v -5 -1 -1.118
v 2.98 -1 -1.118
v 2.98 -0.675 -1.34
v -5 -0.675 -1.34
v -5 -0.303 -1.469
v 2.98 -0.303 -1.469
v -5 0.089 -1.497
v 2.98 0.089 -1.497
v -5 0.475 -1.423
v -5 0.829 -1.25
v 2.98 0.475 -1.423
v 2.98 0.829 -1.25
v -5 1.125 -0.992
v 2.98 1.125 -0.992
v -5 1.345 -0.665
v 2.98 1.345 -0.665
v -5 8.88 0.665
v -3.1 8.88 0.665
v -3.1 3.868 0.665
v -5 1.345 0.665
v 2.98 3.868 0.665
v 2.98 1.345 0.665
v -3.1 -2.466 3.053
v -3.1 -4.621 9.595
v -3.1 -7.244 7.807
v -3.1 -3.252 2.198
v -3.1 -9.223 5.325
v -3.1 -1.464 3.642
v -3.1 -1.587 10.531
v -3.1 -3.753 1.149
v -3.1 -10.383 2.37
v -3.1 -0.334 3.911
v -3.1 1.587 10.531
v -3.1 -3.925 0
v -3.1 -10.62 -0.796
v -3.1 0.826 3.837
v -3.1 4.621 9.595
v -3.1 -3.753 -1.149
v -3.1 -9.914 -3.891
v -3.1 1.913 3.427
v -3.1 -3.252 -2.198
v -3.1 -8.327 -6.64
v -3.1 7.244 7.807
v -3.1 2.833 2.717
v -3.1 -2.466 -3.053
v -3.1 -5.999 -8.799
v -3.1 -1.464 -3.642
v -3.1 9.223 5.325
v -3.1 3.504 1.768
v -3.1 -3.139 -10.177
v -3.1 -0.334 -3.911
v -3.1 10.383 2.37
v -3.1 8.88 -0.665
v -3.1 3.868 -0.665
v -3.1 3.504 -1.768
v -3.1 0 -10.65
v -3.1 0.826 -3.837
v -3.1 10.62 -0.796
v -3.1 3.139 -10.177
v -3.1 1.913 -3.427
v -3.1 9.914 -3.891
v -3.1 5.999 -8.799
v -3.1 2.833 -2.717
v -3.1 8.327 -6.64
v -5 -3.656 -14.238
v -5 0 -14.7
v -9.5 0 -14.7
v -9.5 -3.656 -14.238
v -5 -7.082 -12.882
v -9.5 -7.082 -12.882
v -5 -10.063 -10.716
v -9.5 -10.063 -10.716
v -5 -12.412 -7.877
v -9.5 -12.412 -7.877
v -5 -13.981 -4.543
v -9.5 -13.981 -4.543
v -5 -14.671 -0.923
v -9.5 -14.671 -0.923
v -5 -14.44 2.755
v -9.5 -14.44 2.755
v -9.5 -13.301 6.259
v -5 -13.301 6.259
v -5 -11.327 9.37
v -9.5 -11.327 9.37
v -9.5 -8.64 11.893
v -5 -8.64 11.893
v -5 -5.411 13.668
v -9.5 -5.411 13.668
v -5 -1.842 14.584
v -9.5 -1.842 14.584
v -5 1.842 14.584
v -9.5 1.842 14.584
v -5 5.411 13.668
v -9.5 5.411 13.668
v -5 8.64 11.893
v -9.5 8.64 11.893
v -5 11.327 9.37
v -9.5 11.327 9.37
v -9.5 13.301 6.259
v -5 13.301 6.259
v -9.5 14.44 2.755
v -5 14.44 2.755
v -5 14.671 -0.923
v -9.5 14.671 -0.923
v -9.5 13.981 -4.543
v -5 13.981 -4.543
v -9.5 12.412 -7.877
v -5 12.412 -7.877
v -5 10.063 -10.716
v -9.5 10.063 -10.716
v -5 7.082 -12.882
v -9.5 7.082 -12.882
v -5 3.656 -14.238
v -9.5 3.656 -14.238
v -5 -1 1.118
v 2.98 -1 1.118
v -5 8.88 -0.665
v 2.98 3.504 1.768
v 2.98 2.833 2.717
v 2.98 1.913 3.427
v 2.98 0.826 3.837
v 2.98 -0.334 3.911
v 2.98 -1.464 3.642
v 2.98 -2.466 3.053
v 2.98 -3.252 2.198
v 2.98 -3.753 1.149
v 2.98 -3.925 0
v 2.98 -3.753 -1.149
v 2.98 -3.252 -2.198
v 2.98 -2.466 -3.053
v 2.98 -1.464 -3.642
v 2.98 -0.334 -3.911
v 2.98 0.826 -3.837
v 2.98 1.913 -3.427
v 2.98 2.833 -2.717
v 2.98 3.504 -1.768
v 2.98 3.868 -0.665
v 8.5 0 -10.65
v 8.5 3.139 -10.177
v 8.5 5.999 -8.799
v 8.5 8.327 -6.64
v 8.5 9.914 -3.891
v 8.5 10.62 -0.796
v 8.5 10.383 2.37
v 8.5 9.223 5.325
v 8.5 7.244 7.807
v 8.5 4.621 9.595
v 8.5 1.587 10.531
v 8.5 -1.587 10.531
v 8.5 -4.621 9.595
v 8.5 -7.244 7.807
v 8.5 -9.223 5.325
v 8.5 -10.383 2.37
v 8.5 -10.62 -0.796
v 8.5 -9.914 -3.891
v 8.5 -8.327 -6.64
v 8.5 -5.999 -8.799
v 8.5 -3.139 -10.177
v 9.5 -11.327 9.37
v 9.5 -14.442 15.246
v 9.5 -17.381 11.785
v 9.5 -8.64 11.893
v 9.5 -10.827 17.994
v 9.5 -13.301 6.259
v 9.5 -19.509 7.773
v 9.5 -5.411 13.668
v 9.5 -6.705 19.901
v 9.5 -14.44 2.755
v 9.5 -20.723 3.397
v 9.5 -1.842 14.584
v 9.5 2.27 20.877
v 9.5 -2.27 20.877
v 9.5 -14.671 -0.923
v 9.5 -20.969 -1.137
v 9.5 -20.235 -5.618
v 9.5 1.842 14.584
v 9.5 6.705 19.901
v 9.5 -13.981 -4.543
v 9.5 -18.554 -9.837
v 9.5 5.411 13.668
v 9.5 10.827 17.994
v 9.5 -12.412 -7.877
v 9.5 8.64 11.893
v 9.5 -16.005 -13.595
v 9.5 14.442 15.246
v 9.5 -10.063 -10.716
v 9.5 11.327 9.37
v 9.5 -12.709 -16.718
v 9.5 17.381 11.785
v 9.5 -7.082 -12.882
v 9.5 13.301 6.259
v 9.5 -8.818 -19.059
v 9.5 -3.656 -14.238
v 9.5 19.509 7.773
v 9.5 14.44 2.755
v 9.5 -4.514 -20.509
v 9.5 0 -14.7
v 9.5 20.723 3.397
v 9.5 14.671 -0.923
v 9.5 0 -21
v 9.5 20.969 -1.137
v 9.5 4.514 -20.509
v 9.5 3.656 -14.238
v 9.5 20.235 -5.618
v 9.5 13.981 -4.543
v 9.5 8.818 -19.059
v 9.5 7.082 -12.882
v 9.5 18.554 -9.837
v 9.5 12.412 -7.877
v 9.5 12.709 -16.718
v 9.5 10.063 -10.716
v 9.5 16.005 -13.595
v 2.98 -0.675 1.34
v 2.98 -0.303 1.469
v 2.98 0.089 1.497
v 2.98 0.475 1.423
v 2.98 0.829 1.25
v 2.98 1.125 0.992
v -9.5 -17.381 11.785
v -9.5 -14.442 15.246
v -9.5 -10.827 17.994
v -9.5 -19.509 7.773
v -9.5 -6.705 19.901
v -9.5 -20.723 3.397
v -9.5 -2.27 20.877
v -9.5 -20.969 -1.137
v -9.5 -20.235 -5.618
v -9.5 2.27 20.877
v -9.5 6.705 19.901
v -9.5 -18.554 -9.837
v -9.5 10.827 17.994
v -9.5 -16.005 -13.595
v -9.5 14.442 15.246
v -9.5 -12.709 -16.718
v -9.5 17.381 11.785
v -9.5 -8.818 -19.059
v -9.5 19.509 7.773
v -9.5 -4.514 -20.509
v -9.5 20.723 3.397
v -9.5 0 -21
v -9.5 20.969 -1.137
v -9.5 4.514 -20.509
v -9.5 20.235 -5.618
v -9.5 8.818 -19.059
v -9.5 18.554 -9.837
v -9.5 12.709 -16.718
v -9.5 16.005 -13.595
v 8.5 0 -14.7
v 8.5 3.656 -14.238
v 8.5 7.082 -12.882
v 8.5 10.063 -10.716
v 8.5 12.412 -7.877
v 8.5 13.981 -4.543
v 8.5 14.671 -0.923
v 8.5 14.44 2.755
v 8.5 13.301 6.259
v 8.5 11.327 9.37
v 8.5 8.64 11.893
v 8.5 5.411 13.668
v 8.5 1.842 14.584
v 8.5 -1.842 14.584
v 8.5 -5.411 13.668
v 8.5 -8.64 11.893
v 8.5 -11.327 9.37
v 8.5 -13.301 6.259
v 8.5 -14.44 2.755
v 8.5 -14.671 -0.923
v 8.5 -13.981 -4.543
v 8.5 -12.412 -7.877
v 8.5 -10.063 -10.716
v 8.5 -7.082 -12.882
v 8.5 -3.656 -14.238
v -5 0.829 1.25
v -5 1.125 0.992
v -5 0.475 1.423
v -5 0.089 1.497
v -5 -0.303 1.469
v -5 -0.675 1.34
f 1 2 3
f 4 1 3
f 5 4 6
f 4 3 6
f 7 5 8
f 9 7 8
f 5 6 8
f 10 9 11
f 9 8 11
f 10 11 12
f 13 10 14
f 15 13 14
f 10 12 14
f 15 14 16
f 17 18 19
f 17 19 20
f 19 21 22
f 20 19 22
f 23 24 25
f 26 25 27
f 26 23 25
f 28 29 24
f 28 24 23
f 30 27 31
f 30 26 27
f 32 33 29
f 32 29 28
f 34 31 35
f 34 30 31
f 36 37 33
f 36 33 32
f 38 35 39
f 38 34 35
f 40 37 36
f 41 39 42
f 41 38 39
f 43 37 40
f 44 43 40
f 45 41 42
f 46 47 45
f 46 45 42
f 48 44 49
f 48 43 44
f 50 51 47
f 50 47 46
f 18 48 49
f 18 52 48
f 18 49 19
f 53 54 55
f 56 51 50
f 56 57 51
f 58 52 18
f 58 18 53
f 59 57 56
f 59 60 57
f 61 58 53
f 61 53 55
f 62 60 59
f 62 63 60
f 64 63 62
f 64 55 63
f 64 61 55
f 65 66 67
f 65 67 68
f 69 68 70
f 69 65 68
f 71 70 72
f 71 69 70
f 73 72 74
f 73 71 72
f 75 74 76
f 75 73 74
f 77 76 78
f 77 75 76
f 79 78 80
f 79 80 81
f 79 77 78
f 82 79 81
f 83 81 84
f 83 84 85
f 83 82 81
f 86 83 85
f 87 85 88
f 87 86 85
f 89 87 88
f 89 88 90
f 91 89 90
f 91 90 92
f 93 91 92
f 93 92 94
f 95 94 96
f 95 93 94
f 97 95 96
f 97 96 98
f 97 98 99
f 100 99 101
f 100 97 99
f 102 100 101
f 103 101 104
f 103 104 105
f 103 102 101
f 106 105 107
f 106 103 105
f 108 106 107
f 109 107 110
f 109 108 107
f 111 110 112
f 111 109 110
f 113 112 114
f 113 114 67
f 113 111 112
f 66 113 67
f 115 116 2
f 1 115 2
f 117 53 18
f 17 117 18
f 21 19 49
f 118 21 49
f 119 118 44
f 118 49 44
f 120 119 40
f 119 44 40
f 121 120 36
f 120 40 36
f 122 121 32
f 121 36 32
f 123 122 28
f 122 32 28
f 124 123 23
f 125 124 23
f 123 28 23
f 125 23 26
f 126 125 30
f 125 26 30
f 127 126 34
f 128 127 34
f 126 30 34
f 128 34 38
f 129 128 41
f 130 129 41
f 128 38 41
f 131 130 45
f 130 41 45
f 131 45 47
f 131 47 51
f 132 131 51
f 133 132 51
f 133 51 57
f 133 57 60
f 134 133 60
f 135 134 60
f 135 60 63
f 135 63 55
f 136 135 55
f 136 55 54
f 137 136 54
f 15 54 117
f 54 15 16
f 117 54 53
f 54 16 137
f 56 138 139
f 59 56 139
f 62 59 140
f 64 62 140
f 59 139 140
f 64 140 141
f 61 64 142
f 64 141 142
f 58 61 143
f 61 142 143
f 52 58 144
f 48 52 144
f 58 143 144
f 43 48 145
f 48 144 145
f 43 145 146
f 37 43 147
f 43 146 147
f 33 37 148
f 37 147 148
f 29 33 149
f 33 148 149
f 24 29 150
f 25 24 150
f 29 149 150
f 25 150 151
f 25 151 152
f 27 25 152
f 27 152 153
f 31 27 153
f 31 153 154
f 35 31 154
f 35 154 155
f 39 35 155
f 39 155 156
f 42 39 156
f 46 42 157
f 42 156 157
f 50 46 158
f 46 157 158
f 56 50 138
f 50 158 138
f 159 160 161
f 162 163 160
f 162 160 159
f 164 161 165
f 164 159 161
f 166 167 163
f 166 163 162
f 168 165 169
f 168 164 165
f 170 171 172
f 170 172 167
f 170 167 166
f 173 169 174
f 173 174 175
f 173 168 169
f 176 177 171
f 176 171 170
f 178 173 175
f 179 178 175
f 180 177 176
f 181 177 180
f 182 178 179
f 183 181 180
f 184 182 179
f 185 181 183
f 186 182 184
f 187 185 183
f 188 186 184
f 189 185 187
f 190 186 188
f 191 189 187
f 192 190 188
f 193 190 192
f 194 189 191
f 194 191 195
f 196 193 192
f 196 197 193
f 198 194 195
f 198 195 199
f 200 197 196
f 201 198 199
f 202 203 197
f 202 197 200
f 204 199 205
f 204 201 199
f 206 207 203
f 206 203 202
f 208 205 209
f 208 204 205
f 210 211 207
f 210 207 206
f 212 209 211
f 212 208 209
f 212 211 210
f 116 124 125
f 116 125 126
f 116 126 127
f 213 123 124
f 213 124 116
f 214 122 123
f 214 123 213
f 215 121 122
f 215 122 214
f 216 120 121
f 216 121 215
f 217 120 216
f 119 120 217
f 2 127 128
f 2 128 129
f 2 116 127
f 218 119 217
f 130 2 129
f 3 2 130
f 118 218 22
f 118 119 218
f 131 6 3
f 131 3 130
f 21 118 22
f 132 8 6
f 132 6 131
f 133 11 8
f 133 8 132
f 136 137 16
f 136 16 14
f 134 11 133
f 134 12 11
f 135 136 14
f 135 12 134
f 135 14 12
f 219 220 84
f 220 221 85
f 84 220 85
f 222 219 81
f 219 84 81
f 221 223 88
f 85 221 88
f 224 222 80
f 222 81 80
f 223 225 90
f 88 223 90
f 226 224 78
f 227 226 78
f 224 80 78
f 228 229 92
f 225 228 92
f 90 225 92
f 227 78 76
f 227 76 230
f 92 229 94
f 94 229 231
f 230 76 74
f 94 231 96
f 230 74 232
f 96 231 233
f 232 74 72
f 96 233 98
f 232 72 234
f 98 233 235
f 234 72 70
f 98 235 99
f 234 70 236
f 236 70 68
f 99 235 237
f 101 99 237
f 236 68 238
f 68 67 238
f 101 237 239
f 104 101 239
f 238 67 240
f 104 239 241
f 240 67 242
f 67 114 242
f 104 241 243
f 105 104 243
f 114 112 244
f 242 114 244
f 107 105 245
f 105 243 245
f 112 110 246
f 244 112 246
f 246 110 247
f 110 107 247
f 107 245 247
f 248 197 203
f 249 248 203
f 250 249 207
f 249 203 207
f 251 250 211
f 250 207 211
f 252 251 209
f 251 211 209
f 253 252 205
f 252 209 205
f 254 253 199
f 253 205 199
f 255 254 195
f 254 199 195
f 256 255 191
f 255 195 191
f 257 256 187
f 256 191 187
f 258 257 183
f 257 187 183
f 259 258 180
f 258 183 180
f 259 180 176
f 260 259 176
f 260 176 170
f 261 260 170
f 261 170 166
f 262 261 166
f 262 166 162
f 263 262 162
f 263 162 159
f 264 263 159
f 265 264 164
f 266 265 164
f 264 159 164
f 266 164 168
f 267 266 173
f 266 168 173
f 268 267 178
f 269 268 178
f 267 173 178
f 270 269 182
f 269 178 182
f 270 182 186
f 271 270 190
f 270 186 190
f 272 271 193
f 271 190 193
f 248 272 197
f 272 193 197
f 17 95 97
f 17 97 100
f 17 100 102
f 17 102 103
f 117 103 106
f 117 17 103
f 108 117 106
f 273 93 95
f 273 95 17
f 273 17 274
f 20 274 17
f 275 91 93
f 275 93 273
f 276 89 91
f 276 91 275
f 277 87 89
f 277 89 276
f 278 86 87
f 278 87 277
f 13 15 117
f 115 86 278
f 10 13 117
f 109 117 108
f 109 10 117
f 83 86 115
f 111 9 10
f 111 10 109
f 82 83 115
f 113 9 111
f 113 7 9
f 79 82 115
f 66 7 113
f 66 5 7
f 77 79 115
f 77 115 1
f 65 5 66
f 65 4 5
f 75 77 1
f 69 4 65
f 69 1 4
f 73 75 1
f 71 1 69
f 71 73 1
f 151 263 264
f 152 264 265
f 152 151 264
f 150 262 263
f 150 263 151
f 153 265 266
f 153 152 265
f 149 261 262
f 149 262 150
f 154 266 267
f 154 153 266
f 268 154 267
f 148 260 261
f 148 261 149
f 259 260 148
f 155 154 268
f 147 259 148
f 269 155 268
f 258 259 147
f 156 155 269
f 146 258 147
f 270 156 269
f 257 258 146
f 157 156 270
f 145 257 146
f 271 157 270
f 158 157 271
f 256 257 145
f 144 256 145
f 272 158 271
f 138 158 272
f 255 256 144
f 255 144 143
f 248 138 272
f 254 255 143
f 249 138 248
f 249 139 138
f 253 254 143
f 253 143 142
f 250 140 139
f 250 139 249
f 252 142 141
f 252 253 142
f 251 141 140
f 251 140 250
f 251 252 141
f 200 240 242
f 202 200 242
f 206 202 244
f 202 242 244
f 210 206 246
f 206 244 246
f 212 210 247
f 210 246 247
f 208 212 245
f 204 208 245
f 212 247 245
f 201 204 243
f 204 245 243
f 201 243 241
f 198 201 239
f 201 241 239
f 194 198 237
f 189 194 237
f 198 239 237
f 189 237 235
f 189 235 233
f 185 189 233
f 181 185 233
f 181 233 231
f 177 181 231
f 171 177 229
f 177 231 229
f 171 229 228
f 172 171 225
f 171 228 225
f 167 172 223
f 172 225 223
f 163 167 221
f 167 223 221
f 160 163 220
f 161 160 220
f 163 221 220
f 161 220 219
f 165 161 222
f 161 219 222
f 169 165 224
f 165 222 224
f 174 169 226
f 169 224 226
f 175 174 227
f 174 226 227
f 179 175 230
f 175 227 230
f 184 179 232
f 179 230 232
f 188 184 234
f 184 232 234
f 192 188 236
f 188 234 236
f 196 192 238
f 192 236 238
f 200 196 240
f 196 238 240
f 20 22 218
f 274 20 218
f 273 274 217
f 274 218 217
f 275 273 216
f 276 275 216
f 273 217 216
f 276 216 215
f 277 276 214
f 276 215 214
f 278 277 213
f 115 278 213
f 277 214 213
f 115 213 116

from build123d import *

# Parameters (mm, degrees)
BOSS_EXTRUDE1_DEPTH      = 9.5
BOSS_EXTRUDE1_DEPTH_BACK = 9.5
SKETCH1_R                = 21
SKETCH5_R                = 14.7
CUT_EXTRUDE3_DEPTH       = 1
SKETCH6_R                = 10.65
CUT_EXTRUDE4_DEPTH       = 11.6
SKETCH7_R                = 3.925
BOSS_EXTRUDE2_DEPTH      = 6.08
CUT_EXTRUDE1_DEPTH       = 36.256205128
CUT_EXTRUDE2_START       = -4.5
SKETCH4_R                = 14.7
CUT_EXTRUDE2_DEPTH       = 4.5


with BuildPart() as part:
    # Sketch1 → Boss-Extrude1 (new, two sides: drawn at the far end of the back side and taken through both)
    with BuildSketch(Plane(origin=(0, 0, 0), x_dir=(0, 0, -1), z_dir=(1, 0, 0)).offset(-BOSS_EXTRUDE1_DEPTH_BACK)):
        Circle(SKETCH1_R)
    extrude(amount=BOSS_EXTRUDE1_DEPTH + BOSS_EXTRUDE1_DEPTH_BACK)

    # Sketch5 → Cut-Extrude3 (cut)
    with BuildSketch(Plane(origin=(9.5, 0, 0), x_dir=(0, 0, -1), z_dir=(1, 0, 0))):
        Circle(SKETCH5_R)
    extrude(amount=-CUT_EXTRUDE3_DEPTH, mode=Mode.SUBTRACT)

    # Sketch6 → Cut-Extrude4 (cut)
    with BuildSketch(Plane(origin=(8.5, 0, 0), x_dir=(0, 0, -1), z_dir=(1, 0, 0))):
        Circle(SKETCH6_R)
    extrude(amount=-CUT_EXTRUDE4_DEPTH, mode=Mode.SUBTRACT)

    # Sketch7 → Boss-Extrude2 (add)
    with BuildSketch(Plane(origin=(-3.1, 0, 0), x_dir=(0, 0, -1), z_dir=(1, 0, 0))):
        Circle(SKETCH7_R)
    extrude(amount=BOSS_EXTRUDE2_DEPTH)

    # Sketch2 → Cut-Extrude1 (cut, through all)
    with BuildSketch(Plane(origin=(9.5, 0, 0), x_dir=(0, 0, -1), z_dir=(1, 0, 0))):
        with BuildLine():
            Line((-1.118033989, -1), (1.118033989, -1))
            ThreePointArc((1.118033989, -1), (1.472757251, 0.284580535), (0.665, 1.344535236))
            Line((0.665, 1.344535236), (0.665, 8.879705587))
            Line((0.665, 8.879705587), (-0.665, 8.879705587))
            Line((-0.665, 8.879705587), (-0.665, 1.344535236))
            ThreePointArc((-0.665, 1.344535236), (-1.472757251, 0.284580535), (-1.118033989, -1))
        make_face()
    extrude(amount=-CUT_EXTRUDE1_DEPTH, mode=Mode.SUBTRACT)

    # Sketch4 → Cut-Extrude2 (cut)
    with BuildSketch(Plane.ZY.offset(9.5).offset(CUT_EXTRUDE2_START)):
        Circle(SKETCH4_R)
    extrude(amount=CUT_EXTRUDE2_DEPTH, mode=Mode.SUBTRACT)


solid = part.part
